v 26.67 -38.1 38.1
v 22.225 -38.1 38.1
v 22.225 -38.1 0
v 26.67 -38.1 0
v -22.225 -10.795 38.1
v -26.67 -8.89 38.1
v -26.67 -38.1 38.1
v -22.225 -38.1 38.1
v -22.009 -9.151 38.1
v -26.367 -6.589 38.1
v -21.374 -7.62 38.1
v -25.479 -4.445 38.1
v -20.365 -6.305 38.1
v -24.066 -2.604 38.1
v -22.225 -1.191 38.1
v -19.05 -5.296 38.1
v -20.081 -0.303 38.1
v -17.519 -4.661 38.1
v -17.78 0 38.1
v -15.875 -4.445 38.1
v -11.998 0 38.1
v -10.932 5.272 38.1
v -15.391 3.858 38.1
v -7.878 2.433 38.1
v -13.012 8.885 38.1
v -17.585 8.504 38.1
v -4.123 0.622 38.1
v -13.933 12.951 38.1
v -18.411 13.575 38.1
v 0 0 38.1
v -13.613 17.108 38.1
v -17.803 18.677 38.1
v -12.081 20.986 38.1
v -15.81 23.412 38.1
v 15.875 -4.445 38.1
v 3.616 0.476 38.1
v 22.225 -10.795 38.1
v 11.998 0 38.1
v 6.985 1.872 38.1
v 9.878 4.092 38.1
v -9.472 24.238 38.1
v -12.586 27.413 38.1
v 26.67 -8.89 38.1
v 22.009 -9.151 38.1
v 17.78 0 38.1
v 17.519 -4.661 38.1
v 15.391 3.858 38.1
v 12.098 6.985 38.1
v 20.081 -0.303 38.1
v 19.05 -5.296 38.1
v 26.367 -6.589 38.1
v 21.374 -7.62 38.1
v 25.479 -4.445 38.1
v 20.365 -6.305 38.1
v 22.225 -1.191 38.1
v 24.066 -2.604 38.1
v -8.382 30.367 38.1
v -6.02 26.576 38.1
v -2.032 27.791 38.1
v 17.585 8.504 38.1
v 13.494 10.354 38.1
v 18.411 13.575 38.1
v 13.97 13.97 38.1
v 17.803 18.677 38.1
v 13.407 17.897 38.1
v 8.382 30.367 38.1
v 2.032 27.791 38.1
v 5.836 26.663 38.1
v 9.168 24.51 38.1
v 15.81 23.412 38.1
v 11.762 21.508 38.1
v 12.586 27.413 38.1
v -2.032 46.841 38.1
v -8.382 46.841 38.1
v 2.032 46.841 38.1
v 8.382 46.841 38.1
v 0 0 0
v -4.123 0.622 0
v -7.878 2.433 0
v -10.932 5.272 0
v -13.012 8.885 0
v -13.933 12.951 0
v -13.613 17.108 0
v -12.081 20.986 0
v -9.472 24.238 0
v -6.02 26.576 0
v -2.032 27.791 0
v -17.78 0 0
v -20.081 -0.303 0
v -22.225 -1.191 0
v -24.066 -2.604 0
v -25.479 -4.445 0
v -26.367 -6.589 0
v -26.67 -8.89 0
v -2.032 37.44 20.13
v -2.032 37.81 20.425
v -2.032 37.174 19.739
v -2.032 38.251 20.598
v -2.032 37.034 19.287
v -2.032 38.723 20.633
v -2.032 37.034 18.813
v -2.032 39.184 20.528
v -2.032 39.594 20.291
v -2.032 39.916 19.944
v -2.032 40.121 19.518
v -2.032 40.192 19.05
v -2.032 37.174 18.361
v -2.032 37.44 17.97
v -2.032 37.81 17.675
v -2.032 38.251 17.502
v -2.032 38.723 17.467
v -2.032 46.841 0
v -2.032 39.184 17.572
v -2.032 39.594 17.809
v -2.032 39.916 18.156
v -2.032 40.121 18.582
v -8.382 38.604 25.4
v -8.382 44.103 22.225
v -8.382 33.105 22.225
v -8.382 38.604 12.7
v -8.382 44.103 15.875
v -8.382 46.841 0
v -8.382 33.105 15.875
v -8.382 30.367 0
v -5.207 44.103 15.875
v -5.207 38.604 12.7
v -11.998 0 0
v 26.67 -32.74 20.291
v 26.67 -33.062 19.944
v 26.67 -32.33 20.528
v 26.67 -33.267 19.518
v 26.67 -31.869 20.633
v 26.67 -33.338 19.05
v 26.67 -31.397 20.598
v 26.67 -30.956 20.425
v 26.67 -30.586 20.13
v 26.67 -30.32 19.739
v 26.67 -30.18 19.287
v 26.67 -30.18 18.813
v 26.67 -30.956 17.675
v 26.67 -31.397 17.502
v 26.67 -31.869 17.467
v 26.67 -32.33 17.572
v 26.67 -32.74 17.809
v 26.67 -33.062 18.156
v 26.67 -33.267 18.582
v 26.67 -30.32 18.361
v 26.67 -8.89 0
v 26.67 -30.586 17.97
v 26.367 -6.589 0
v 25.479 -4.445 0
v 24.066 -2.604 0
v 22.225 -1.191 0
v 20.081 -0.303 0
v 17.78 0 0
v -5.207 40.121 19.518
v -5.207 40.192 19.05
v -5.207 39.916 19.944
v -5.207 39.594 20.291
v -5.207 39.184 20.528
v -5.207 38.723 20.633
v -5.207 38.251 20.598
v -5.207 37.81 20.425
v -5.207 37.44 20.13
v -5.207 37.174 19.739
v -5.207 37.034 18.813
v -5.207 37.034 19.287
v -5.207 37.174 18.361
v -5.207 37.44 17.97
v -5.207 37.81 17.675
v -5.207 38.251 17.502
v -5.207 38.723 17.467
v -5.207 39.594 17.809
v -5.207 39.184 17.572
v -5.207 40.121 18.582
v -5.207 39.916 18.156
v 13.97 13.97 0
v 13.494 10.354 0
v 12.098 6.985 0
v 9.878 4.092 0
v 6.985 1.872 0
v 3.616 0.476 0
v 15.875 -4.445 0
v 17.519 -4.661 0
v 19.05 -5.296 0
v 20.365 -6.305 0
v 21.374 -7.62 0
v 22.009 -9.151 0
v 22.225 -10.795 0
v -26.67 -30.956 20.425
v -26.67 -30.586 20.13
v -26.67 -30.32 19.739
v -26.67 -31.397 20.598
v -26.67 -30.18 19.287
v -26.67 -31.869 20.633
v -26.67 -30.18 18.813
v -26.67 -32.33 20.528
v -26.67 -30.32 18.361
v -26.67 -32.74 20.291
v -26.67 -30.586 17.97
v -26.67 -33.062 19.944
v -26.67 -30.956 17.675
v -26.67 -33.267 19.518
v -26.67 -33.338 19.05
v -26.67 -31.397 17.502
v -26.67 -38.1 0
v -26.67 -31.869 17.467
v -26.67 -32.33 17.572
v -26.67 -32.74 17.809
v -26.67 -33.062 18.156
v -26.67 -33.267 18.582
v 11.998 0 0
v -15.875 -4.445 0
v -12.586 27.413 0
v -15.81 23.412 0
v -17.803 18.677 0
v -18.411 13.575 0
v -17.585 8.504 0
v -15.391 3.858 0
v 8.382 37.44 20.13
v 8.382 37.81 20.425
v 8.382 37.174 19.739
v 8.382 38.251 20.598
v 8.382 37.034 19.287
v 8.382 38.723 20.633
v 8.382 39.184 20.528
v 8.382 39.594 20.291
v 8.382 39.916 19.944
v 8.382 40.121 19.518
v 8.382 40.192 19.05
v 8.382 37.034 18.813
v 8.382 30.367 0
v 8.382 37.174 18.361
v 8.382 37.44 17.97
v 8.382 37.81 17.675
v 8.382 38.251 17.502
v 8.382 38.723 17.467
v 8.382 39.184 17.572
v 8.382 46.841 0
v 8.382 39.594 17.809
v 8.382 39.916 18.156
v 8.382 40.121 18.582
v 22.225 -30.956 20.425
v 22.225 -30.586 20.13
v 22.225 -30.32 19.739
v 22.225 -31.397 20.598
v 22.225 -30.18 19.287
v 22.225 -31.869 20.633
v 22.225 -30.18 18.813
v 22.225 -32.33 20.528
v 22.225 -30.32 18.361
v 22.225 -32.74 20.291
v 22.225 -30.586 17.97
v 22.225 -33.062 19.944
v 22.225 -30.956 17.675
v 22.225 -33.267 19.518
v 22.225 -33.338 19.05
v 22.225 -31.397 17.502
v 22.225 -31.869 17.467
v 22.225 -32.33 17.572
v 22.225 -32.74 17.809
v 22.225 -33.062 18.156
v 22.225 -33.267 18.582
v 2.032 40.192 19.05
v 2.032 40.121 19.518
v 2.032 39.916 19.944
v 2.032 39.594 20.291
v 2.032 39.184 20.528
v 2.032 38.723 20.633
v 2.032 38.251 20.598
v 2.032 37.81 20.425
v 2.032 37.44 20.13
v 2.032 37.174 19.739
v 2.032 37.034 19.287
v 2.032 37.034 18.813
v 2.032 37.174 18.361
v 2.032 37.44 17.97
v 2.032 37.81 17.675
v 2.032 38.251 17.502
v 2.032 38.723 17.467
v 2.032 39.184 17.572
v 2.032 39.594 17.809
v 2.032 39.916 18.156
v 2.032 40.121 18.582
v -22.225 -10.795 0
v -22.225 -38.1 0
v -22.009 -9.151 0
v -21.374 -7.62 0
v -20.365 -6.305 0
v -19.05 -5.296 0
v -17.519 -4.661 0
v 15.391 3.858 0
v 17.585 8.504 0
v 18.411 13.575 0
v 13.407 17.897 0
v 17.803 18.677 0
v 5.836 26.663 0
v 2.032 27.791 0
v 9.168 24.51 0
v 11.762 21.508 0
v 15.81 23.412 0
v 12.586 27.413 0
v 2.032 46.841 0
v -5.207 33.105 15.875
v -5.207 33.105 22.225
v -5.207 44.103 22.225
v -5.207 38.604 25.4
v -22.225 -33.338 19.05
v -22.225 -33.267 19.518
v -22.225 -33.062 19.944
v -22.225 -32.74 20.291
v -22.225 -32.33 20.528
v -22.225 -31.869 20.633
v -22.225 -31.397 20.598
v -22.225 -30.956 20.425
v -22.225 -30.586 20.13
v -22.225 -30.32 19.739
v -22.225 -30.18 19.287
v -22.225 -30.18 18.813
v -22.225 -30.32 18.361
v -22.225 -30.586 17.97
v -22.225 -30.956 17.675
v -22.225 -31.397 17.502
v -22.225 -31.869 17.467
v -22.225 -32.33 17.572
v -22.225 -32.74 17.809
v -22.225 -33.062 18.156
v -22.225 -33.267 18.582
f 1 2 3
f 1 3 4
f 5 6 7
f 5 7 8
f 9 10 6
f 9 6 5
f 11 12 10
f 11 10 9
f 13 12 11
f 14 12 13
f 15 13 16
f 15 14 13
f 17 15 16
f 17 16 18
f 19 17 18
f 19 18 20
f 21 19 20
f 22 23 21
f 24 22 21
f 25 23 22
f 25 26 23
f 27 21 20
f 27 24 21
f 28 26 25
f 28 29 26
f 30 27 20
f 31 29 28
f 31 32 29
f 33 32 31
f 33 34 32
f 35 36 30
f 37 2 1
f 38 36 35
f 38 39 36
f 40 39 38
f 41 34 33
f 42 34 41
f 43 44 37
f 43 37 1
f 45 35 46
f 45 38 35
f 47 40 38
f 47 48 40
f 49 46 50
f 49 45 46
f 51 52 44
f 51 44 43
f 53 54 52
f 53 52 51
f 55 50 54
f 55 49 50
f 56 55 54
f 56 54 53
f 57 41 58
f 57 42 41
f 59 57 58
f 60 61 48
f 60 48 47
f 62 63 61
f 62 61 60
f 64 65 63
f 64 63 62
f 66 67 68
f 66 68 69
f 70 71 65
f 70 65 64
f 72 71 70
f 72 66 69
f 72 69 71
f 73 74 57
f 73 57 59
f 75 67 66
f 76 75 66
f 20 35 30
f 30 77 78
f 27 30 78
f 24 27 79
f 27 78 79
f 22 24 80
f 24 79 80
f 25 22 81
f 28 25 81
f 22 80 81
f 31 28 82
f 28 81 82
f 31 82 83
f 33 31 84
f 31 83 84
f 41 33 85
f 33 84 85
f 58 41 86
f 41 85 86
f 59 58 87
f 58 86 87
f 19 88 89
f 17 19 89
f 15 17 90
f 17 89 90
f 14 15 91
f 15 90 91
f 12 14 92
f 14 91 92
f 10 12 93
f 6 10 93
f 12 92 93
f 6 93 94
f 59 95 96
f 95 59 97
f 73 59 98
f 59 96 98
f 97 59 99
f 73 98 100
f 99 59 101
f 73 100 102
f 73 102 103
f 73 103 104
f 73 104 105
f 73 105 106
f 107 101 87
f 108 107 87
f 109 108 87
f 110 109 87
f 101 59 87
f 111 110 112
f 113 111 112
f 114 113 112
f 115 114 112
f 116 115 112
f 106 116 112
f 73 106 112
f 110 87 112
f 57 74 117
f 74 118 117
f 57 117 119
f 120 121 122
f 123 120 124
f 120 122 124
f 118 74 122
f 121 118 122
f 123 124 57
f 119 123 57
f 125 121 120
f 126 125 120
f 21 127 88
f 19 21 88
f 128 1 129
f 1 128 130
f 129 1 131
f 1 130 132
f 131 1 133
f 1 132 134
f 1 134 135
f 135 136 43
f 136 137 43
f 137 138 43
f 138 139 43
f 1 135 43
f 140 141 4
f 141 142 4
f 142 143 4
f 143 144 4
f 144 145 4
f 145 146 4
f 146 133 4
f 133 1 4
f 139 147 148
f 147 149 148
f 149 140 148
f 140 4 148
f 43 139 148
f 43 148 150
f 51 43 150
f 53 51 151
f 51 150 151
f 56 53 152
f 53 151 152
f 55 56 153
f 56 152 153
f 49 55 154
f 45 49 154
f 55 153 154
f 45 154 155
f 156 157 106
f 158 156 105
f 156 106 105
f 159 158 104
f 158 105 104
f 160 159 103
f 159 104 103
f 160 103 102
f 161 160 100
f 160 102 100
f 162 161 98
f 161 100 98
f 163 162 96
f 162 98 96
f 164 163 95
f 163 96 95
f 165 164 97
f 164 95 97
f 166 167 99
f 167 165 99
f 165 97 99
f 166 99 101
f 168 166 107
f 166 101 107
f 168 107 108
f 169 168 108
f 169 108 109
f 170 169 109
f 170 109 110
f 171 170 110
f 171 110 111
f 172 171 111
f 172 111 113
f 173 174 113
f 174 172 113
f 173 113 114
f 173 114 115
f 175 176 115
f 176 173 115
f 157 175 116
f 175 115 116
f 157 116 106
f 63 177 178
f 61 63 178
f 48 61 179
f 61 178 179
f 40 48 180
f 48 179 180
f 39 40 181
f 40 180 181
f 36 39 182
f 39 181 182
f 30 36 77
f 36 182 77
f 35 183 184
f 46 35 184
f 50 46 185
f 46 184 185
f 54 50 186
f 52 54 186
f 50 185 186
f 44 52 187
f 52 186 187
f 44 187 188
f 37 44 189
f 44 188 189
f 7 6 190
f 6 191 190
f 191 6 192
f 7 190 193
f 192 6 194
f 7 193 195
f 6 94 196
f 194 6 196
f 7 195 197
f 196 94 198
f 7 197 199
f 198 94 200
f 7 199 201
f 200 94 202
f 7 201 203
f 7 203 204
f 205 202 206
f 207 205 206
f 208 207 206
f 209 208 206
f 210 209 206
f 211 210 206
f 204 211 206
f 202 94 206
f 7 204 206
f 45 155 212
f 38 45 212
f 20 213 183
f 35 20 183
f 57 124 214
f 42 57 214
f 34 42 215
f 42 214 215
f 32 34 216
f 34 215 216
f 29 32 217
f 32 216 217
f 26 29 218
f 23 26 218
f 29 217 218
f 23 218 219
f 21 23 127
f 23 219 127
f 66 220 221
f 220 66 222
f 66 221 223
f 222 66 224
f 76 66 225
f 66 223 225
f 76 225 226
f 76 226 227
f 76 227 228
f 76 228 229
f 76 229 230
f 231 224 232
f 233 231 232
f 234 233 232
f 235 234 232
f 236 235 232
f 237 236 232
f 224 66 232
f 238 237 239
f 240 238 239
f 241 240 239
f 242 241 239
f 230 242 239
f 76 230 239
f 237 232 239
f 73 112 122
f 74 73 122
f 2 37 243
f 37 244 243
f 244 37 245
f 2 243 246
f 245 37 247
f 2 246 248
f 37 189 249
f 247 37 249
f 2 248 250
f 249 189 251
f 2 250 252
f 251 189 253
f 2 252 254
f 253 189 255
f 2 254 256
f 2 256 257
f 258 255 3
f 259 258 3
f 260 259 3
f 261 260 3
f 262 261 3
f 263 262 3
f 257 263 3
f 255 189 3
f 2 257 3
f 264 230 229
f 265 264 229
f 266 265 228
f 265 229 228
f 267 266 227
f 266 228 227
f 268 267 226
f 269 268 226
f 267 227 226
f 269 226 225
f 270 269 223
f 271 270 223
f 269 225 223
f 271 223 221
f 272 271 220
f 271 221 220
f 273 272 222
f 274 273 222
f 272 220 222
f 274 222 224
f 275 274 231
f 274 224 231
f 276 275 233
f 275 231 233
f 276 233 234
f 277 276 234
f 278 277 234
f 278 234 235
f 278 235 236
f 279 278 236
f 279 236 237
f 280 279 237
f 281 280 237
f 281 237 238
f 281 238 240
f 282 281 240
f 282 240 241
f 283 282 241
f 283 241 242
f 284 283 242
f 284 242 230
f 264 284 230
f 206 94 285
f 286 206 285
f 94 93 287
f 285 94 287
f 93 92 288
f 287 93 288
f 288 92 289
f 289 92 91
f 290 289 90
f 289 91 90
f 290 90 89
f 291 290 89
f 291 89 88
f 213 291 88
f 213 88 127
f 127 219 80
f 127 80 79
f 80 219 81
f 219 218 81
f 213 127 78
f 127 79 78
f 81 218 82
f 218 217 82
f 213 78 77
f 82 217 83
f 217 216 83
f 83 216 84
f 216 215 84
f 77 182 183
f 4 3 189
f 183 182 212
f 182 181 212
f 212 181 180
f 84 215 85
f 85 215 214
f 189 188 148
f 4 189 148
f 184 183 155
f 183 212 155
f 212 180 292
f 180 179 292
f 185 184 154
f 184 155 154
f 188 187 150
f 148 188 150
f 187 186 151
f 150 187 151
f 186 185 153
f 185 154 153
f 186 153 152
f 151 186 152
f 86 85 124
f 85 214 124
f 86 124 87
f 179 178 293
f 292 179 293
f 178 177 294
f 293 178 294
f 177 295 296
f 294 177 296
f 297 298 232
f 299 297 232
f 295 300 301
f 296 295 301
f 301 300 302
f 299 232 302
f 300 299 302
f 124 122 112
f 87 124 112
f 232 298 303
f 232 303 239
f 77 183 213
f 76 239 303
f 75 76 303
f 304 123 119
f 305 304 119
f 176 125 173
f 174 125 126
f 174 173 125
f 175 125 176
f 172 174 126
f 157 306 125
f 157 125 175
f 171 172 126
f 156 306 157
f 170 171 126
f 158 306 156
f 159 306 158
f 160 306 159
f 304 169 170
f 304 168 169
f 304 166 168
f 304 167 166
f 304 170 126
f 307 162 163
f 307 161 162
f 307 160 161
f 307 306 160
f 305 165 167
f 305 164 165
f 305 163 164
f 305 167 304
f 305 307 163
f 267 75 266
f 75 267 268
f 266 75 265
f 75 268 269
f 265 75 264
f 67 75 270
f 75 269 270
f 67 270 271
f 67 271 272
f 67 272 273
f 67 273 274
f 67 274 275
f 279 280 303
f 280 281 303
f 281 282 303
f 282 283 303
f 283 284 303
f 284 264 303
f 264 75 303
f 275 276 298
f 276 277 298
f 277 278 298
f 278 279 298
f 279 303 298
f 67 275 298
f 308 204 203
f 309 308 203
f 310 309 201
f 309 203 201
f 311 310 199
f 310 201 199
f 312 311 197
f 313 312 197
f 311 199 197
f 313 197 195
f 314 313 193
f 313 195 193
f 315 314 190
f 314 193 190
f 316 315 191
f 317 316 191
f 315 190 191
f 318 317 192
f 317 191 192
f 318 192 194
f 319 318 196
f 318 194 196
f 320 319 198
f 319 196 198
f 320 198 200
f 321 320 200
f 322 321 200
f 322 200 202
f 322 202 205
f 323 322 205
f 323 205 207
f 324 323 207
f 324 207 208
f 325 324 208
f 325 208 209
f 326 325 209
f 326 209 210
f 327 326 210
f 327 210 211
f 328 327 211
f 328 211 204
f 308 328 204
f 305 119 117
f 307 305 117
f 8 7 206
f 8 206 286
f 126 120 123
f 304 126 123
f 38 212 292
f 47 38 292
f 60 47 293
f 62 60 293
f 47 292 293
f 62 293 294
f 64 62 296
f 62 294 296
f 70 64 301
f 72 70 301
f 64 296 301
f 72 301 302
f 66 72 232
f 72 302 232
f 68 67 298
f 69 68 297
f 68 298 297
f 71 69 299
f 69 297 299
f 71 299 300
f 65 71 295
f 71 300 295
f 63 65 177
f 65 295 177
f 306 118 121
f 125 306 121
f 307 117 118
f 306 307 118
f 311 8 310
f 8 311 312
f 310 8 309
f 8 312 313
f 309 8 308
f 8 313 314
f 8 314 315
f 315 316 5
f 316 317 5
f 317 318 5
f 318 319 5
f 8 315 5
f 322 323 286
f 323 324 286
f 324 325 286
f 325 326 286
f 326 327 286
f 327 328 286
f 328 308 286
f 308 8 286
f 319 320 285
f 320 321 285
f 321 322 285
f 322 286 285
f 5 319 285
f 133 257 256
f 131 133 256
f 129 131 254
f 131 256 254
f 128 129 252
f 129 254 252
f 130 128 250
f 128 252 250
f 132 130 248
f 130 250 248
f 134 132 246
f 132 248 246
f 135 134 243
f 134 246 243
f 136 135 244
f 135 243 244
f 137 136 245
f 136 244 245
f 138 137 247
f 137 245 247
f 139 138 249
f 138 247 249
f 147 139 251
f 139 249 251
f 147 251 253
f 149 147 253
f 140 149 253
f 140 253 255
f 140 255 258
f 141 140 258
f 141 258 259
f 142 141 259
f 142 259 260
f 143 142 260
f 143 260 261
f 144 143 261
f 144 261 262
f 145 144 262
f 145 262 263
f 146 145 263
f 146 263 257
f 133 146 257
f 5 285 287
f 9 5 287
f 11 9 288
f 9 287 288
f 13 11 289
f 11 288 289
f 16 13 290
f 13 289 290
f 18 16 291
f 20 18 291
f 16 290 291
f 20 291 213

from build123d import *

# Parameters (mm, degrees)
F1_DEPTH = 38.1
F2_R     = 1.5875
F3_DEPTH = 35.053
F4_R     = 1.5875
F5_DEPTH = 3.175
F6_R     = 1.5875
F7_DEPTH = 53.341


with BuildPart() as f1:
    # F0 (on Top) → F1 (new body)
    with BuildSketch(Plane.XY):
        with BuildLine():
            Line((-11.9979717036, 0), (-17.78, 0))
            ThreePointArc((-17.78, 0), (-24.0661792847, -2.6038207153), (-26.67, -8.89))
            Line((-26.67, -8.89), (-26.67, -38.1))
            Line((-26.67, -38.1), (-22.225, -38.1))
            Line((-22.225, -38.1), (-22.225, -10.795))
            ThreePointArc((-22.225, -10.795), (-20.3651280605, -6.3048719395), (-15.875, -4.445))
            Line((-15.875, -4.445), (-2.57e-08, -4.445))
            ThreePointArc((-2.57e-08, -4.445), (-6.3974477453, -3.2980307895), (-11.9979717036, 0))
        make_face()
        with BuildLine():
            Line((9.2e-09, 0), (-11.9979717036, 0))
            ThreePointArc((-11.9979717036, 0), (-6.3974477453, -3.2980307895), (-2.57e-08, -4.445))
            ThreePointArc((-2.57e-08, -4.445), (6.3974477212, -3.2980307984), (11.9979717036, 0))
            Line((11.9979717036, 0), (9.2e-09, 0))
        make_face()
        with BuildLine():
            ThreePointArc((11.9979717036, 0), (6.3974477212, -3.2980307984), (-2.57e-08, -4.445))
            Line((-2.57e-08, -4.445), (15.875, -4.445))
            ThreePointArc((15.875, -4.445), (20.3651280605, -6.3048719395), (22.225, -10.795))
            Line((22.225, -10.795), (22.225, -38.1))
            Line((22.225, -38.1), (26.67, -38.1))
            Line((26.67, -38.1), (26.67, -8.89))
            ThreePointArc((26.67, -8.89), (24.0661792847, -2.6038207153), (17.78, 0))
            Line((17.78, 0), (11.9979717036, 0))
        make_face()
        with BuildLine():
            ThreePointArc((13.97, 13.97), (9.8782817364, 4.0917182701), (9.2e-09, 0))
            Line((9.2e-09, 0), (11.9979717036, 0))
            ThreePointArc((11.9979717036, 0), (16.7340203466, 6.2833370024), (18.415, 13.97))
            ThreePointArc((18.415, 13.97), (15.7077489635, 23.5813915486), (8.382, 30.3667771528))
            Line((8.382, 30.3667771528), (8.382, 27.7914281462))
            Line((8.382, 27.7914281462), (2.032, 27.7914281462))
            ThreePointArc((2.032, 27.7914281462), (10.5723209372, 23.1016444302), (13.97, 13.97))
        make_face()
        with BuildLine():
            ThreePointArc((-8.382, 30.3667771528), (-18.285816917, 16.1474123812), (-11.9979717036, 0))
            Line((-11.9979717036, 0), (9.2e-09, 0))
            ThreePointArc((9.2e-09, 0), (-13.9328075273, 12.9512878678), (-2.032, 27.7914281462))
            Line((-2.032, 27.7914281462), (-8.382, 27.7914281462))
            Line((-8.382, 27.7914281462), (-8.382, 30.3667771528))
        make_face()
        with BuildLine():
            Line((2.032, 32.2725462983), (2.032, 27.7914281462))
            Line((2.032, 27.7914281462), (8.382, 27.7914281462))
            Line((8.382, 27.7914281462), (8.382, 30.3667771528))
            ThreePointArc((8.382, 30.3667771528), (5.2934712627, 31.6077829387), (2.032, 32.2725462983))
        make_face()
        with BuildLine():
            Line((2.032, 46.8414281462), (2.032, 32.2725462983))
            ThreePointArc((2.032, 32.2725462983), (5.2934712627, 31.6077829387), (8.382, 30.3667771528))
            Line((8.382, 30.3667771528), (8.382, 46.8414281462))
            Line((8.382, 46.8414281462), (2.032, 46.8414281462))
        make_face()
        with BuildLine():
            ThreePointArc((-2.032, 32.2725462983), (-5.2934712627, 31.6077829387), (-8.382, 30.3667771528))
            Line((-8.382, 30.3667771528), (-8.382, 27.7914281462))
            Line((-8.382, 27.7914281462), (-2.032, 27.7914281462))
            Line((-2.032, 27.7914281462), (-2.032, 32.2725462983))
        make_face()
        with BuildLine():
            Line((-8.382, 46.8414281462), (-8.382, 30.3667771528))
            ThreePointArc((-8.382, 30.3667771528), (-5.2934712627, 31.6077829387), (-2.032, 32.2725462983))
            Line((-2.032, 32.2725462983), (-2.032, 46.8414281462))
            Line((-2.032, 46.8414281462), (-8.382, 46.8414281462))
        make_face()
    extrude(amount=F1_DEPTH)

    # F2 (on face) → F3 (cut, through all)
    with BuildSketch(Plane.YZ.offset(8.382)):
        with Locations((38.6041026495, 19.05)):
            Circle(F2_R)
    extrude(amount=-F3_DEPTH, mode=Mode.SUBTRACT)

    # F4 (on face) → F5 (cut)
    with BuildSketch(Plane(origin=(-8.382, 0, 0), x_dir=(0, -1, 0), z_dir=(-1, 0, 0))):
        Polygon((-44.1033639635, 22.225), (-44.1033639635, 15.875), (-38.6041026495, 12.7), (-33.1048413355, 15.875), (-33.1048413355, 22.225), (-38.6041026495, 25.4), align=None)
        with Locations((-38.6041026495, 19.05)):
            Circle(F4_R, mode=Mode.SUBTRACT)
    extrude(amount=-F5_DEPTH, mode=Mode.SUBTRACT)

    # F6 (on face) → F7 (cut, through all)
    with BuildSketch(Plane(origin=(-26.67, 0, 0), x_dir=(0, -1, 0), z_dir=(-1, 0, 0))):
        with Locations((31.75, 19.05)):
            Circle(F6_R)
    extrude(amount=-F7_DEPTH, mode=Mode.SUBTRACT)


solid = f1.part
